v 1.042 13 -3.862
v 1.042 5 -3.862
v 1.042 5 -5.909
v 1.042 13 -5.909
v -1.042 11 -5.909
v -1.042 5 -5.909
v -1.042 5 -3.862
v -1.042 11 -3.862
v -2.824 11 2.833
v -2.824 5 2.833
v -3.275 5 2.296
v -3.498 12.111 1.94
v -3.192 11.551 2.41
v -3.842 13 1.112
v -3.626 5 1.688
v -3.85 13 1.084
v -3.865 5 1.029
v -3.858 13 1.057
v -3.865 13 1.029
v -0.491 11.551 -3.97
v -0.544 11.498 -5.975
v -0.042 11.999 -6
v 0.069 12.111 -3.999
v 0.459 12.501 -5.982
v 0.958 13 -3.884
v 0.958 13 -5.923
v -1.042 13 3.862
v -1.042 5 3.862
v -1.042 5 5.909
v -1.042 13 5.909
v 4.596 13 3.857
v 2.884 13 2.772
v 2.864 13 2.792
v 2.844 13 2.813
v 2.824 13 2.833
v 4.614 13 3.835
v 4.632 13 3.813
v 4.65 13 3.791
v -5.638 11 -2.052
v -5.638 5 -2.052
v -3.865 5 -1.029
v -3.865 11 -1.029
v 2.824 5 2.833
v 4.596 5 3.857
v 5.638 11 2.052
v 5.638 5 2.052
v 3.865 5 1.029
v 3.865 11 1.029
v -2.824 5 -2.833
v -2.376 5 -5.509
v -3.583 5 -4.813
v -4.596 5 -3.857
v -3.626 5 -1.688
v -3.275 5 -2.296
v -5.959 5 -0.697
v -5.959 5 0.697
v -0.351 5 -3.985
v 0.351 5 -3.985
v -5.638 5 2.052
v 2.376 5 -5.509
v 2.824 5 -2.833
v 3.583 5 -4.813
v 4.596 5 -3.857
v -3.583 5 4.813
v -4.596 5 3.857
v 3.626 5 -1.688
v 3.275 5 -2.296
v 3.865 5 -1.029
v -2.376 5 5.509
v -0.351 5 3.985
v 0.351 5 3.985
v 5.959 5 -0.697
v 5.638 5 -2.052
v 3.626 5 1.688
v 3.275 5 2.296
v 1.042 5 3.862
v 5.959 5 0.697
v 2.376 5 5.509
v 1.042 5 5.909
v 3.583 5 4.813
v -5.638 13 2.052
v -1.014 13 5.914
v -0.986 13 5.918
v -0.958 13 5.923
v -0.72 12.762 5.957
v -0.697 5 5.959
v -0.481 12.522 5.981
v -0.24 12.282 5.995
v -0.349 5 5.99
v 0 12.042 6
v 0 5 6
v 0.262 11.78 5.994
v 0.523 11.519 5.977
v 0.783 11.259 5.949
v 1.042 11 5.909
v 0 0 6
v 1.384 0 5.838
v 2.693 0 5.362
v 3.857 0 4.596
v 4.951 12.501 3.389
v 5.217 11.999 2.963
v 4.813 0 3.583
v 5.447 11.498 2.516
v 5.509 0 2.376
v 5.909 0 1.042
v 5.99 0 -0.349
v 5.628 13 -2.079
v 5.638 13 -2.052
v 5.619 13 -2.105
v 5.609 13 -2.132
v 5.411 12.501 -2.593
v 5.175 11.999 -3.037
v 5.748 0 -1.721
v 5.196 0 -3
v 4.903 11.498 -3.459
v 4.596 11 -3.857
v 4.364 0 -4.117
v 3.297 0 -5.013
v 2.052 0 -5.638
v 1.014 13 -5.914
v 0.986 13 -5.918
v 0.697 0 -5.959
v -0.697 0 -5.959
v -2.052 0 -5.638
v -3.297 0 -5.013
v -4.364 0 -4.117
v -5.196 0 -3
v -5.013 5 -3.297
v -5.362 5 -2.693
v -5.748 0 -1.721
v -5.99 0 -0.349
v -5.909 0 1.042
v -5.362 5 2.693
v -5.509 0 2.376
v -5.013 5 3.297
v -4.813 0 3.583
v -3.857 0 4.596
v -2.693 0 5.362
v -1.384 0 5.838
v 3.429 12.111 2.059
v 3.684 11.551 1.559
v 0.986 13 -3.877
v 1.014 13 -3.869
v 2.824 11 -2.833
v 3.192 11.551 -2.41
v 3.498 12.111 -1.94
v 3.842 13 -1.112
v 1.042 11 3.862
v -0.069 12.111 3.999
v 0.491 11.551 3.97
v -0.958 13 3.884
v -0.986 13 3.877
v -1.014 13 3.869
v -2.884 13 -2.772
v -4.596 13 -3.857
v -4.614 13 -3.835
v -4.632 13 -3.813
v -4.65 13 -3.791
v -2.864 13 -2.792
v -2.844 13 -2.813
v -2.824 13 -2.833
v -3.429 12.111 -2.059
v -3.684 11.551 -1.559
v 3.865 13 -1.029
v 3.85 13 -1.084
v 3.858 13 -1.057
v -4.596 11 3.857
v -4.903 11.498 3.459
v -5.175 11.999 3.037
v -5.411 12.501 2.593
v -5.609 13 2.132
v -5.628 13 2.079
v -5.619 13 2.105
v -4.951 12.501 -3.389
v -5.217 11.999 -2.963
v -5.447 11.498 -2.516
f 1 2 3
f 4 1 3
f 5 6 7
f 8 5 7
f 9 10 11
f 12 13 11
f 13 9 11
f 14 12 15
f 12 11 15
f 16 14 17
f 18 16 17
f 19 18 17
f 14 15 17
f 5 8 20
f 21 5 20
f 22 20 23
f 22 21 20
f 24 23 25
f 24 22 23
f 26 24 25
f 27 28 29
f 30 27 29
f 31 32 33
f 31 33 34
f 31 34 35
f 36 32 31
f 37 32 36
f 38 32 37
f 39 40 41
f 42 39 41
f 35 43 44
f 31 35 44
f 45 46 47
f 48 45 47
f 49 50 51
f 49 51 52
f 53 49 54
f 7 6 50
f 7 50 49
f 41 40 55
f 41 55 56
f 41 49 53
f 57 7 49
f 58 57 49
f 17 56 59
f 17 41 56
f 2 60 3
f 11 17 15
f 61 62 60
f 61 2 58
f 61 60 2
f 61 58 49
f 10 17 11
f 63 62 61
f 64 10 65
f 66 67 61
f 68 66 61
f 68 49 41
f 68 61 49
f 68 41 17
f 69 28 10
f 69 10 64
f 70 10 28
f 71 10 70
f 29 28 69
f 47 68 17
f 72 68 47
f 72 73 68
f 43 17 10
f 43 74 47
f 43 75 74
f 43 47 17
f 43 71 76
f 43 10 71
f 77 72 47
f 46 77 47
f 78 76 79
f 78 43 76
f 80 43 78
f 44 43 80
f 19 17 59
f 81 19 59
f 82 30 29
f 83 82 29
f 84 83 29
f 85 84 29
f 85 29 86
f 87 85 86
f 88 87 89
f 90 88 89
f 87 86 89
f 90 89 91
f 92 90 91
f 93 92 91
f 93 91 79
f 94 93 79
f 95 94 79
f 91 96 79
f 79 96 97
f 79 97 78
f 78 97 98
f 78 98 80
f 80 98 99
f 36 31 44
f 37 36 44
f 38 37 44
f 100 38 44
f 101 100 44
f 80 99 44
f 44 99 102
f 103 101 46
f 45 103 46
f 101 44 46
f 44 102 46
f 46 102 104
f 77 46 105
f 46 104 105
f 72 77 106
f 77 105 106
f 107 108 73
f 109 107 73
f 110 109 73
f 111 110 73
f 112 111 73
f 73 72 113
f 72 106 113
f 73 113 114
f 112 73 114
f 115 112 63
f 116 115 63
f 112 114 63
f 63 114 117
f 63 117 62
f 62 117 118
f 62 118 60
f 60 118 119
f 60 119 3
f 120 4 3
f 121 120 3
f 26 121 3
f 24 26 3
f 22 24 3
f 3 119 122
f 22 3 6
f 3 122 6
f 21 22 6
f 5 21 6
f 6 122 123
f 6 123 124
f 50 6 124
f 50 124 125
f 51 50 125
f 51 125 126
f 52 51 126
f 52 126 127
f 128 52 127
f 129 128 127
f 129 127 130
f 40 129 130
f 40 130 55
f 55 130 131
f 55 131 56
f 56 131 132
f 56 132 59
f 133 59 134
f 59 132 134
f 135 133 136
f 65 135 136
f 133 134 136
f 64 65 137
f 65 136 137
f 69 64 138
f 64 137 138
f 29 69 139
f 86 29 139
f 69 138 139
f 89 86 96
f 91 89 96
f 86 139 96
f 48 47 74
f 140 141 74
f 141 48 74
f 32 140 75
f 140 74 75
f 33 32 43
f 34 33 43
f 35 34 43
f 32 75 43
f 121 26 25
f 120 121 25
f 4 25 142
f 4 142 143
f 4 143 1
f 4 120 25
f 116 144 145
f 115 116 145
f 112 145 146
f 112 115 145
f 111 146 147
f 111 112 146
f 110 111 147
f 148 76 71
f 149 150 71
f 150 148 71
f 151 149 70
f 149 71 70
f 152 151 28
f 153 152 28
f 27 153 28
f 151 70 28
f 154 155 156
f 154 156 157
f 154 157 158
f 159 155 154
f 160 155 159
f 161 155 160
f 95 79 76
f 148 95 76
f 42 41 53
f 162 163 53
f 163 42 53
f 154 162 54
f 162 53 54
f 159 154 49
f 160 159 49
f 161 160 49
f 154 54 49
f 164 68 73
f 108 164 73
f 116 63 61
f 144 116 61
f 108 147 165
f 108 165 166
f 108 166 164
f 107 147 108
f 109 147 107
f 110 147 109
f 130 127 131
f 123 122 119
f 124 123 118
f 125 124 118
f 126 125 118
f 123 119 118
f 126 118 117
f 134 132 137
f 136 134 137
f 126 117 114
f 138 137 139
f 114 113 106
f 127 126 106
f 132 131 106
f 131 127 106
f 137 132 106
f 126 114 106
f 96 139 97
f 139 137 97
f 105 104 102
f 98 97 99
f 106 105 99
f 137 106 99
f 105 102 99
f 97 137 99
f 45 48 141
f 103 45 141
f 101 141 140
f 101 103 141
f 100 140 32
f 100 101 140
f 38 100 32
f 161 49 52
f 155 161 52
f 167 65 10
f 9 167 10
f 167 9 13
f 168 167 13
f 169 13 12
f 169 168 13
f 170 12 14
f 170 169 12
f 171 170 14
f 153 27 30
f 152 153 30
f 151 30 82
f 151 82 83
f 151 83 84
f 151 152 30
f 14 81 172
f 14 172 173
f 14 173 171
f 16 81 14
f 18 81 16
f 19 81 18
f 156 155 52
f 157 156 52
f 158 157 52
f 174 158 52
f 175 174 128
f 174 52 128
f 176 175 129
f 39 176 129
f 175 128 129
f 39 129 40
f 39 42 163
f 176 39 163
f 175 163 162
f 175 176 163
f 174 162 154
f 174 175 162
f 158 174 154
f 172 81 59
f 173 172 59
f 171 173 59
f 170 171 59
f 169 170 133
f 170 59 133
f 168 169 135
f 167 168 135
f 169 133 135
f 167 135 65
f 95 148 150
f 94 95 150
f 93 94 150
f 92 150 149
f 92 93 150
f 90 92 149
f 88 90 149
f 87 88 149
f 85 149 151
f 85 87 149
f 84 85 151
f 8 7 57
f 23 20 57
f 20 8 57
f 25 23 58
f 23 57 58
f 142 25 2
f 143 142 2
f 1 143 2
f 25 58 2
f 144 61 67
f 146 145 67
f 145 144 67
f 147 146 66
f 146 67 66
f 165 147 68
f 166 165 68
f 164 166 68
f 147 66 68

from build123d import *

# Parameters (mm, degrees)
SKETCH1_R           = 6
BOSS_EXTRUDE1_DEPTH = 5
BOSS_EXTRUDE3_DEPTH = 8
CHAMFER2_SIZE       = 2


with BuildPart() as part:
    # Sketch1 → Boss-Extrude1 (new body)
    with BuildSketch(Plane(origin=(0, 0, 0), x_dir=(1, 0, 0), z_dir=(0, 1, 0))):
        Circle(SKETCH1_R)
    extrude(amount=BOSS_EXTRUDE1_DEPTH)

    # Sketch5 → Boss-Extrude3 (add)
    with BuildSketch(Plane(origin=(0, 5, 0), x_dir=(1, 0, 0), z_dir=(0, 1, 0))):
        with BuildLine():
            ThreePointArc((5.638155725, 2.05212086), (5.196152423, 3), (4.596266659, 3.856725658))
            Line((4.596266659, 3.856725658), (2.823580901, 2.833265059))
            ThreePointArc((2.823580901, 2.833265059), (3.464101615, 2), (3.865469967, 1.028660261))
            Line((3.865469967, 1.028660261), (5.638155725, 2.05212086))
        make_face()
        with BuildLine():
            Line((1.041889066, 3.86192532), (1.041889066, 5.908846518))
            ThreePointArc((1.041889066, 5.908846518), (0, 6), (-1.041889066, 5.908846518))
            Line((-1.041889066, 5.908846518), (-1.041889066, 3.86192532))
            ThreePointArc((-1.041889066, 3.86192532), (0, 4), (1.041889066, 3.86192532))
        make_face()
        with BuildLine():
            ThreePointArc((4.596266659, -3.856725658), (5.196152423, -3), (5.638155725, -2.05212086))
            Line((5.638155725, -2.05212086), (3.865469967, -1.028660261))
            ThreePointArc((3.865469967, -1.028660261), (3.464101615, -2), (2.823580901, -2.833265059))
            Line((2.823580901, -2.833265059), (4.596266659, -3.856725658))
        make_face()
        with BuildLine():
            Line((-2.823580901, 2.833265059), (-4.596266659, 3.856725658))
            ThreePointArc((-4.596266659, 3.856725658), (-5.196152423, 3), (-5.638155725, 2.05212086))
            Line((-5.638155725, 2.05212086), (-3.865469967, 1.028660261))
            ThreePointArc((-3.865469967, 1.028660261), (-3.464101615, 2), (-2.823580901, 2.833265059))
        make_face()
        with BuildLine():
            ThreePointArc((-1.041889066, -5.908846518), (0, -6), (1.041889066, -5.908846518))
            Line((1.041889066, -5.908846518), (1.041889066, -3.86192532))
            ThreePointArc((1.041889066, -3.86192532), (0, -4), (-1.041889066, -3.86192532))
            Line((-1.041889066, -3.86192532), (-1.041889066, -5.908846518))
        make_face()
        with BuildLine():
            Line((-3.865469967, -1.028660261), (-5.638155725, -2.05212086))
            ThreePointArc((-5.638155725, -2.05212086), (-5.196152423, -3), (-4.596266659, -3.856725658))
            Line((-4.596266659, -3.856725658), (-2.823580901, -2.833265059))
            ThreePointArc((-2.823580901, -2.833265059), (-3.464101615, -2), (-3.865469967, -1.028660261))
        make_face()
    extrude(amount=BOSS_EXTRUDE3_DEPTH)

    # Chamfer2
    chamfer2_edges = [part.edges().sort_by_distance(p)[0] for p in [
        (1.041889066, 13, 4.885385919),
        (-3.70992378, 13, 3.344995359),
        (-4.751812846, 13, -1.54039056),
        (-1.041889066, 13, -4.885385919),
        (3.70992378, 13, -3.344995359),
        (4.751812846, 13, 1.54039056),
    ]]
    chamfer(chamfer2_edges, length=CHAMFER2_SIZE)


solid = part.part
